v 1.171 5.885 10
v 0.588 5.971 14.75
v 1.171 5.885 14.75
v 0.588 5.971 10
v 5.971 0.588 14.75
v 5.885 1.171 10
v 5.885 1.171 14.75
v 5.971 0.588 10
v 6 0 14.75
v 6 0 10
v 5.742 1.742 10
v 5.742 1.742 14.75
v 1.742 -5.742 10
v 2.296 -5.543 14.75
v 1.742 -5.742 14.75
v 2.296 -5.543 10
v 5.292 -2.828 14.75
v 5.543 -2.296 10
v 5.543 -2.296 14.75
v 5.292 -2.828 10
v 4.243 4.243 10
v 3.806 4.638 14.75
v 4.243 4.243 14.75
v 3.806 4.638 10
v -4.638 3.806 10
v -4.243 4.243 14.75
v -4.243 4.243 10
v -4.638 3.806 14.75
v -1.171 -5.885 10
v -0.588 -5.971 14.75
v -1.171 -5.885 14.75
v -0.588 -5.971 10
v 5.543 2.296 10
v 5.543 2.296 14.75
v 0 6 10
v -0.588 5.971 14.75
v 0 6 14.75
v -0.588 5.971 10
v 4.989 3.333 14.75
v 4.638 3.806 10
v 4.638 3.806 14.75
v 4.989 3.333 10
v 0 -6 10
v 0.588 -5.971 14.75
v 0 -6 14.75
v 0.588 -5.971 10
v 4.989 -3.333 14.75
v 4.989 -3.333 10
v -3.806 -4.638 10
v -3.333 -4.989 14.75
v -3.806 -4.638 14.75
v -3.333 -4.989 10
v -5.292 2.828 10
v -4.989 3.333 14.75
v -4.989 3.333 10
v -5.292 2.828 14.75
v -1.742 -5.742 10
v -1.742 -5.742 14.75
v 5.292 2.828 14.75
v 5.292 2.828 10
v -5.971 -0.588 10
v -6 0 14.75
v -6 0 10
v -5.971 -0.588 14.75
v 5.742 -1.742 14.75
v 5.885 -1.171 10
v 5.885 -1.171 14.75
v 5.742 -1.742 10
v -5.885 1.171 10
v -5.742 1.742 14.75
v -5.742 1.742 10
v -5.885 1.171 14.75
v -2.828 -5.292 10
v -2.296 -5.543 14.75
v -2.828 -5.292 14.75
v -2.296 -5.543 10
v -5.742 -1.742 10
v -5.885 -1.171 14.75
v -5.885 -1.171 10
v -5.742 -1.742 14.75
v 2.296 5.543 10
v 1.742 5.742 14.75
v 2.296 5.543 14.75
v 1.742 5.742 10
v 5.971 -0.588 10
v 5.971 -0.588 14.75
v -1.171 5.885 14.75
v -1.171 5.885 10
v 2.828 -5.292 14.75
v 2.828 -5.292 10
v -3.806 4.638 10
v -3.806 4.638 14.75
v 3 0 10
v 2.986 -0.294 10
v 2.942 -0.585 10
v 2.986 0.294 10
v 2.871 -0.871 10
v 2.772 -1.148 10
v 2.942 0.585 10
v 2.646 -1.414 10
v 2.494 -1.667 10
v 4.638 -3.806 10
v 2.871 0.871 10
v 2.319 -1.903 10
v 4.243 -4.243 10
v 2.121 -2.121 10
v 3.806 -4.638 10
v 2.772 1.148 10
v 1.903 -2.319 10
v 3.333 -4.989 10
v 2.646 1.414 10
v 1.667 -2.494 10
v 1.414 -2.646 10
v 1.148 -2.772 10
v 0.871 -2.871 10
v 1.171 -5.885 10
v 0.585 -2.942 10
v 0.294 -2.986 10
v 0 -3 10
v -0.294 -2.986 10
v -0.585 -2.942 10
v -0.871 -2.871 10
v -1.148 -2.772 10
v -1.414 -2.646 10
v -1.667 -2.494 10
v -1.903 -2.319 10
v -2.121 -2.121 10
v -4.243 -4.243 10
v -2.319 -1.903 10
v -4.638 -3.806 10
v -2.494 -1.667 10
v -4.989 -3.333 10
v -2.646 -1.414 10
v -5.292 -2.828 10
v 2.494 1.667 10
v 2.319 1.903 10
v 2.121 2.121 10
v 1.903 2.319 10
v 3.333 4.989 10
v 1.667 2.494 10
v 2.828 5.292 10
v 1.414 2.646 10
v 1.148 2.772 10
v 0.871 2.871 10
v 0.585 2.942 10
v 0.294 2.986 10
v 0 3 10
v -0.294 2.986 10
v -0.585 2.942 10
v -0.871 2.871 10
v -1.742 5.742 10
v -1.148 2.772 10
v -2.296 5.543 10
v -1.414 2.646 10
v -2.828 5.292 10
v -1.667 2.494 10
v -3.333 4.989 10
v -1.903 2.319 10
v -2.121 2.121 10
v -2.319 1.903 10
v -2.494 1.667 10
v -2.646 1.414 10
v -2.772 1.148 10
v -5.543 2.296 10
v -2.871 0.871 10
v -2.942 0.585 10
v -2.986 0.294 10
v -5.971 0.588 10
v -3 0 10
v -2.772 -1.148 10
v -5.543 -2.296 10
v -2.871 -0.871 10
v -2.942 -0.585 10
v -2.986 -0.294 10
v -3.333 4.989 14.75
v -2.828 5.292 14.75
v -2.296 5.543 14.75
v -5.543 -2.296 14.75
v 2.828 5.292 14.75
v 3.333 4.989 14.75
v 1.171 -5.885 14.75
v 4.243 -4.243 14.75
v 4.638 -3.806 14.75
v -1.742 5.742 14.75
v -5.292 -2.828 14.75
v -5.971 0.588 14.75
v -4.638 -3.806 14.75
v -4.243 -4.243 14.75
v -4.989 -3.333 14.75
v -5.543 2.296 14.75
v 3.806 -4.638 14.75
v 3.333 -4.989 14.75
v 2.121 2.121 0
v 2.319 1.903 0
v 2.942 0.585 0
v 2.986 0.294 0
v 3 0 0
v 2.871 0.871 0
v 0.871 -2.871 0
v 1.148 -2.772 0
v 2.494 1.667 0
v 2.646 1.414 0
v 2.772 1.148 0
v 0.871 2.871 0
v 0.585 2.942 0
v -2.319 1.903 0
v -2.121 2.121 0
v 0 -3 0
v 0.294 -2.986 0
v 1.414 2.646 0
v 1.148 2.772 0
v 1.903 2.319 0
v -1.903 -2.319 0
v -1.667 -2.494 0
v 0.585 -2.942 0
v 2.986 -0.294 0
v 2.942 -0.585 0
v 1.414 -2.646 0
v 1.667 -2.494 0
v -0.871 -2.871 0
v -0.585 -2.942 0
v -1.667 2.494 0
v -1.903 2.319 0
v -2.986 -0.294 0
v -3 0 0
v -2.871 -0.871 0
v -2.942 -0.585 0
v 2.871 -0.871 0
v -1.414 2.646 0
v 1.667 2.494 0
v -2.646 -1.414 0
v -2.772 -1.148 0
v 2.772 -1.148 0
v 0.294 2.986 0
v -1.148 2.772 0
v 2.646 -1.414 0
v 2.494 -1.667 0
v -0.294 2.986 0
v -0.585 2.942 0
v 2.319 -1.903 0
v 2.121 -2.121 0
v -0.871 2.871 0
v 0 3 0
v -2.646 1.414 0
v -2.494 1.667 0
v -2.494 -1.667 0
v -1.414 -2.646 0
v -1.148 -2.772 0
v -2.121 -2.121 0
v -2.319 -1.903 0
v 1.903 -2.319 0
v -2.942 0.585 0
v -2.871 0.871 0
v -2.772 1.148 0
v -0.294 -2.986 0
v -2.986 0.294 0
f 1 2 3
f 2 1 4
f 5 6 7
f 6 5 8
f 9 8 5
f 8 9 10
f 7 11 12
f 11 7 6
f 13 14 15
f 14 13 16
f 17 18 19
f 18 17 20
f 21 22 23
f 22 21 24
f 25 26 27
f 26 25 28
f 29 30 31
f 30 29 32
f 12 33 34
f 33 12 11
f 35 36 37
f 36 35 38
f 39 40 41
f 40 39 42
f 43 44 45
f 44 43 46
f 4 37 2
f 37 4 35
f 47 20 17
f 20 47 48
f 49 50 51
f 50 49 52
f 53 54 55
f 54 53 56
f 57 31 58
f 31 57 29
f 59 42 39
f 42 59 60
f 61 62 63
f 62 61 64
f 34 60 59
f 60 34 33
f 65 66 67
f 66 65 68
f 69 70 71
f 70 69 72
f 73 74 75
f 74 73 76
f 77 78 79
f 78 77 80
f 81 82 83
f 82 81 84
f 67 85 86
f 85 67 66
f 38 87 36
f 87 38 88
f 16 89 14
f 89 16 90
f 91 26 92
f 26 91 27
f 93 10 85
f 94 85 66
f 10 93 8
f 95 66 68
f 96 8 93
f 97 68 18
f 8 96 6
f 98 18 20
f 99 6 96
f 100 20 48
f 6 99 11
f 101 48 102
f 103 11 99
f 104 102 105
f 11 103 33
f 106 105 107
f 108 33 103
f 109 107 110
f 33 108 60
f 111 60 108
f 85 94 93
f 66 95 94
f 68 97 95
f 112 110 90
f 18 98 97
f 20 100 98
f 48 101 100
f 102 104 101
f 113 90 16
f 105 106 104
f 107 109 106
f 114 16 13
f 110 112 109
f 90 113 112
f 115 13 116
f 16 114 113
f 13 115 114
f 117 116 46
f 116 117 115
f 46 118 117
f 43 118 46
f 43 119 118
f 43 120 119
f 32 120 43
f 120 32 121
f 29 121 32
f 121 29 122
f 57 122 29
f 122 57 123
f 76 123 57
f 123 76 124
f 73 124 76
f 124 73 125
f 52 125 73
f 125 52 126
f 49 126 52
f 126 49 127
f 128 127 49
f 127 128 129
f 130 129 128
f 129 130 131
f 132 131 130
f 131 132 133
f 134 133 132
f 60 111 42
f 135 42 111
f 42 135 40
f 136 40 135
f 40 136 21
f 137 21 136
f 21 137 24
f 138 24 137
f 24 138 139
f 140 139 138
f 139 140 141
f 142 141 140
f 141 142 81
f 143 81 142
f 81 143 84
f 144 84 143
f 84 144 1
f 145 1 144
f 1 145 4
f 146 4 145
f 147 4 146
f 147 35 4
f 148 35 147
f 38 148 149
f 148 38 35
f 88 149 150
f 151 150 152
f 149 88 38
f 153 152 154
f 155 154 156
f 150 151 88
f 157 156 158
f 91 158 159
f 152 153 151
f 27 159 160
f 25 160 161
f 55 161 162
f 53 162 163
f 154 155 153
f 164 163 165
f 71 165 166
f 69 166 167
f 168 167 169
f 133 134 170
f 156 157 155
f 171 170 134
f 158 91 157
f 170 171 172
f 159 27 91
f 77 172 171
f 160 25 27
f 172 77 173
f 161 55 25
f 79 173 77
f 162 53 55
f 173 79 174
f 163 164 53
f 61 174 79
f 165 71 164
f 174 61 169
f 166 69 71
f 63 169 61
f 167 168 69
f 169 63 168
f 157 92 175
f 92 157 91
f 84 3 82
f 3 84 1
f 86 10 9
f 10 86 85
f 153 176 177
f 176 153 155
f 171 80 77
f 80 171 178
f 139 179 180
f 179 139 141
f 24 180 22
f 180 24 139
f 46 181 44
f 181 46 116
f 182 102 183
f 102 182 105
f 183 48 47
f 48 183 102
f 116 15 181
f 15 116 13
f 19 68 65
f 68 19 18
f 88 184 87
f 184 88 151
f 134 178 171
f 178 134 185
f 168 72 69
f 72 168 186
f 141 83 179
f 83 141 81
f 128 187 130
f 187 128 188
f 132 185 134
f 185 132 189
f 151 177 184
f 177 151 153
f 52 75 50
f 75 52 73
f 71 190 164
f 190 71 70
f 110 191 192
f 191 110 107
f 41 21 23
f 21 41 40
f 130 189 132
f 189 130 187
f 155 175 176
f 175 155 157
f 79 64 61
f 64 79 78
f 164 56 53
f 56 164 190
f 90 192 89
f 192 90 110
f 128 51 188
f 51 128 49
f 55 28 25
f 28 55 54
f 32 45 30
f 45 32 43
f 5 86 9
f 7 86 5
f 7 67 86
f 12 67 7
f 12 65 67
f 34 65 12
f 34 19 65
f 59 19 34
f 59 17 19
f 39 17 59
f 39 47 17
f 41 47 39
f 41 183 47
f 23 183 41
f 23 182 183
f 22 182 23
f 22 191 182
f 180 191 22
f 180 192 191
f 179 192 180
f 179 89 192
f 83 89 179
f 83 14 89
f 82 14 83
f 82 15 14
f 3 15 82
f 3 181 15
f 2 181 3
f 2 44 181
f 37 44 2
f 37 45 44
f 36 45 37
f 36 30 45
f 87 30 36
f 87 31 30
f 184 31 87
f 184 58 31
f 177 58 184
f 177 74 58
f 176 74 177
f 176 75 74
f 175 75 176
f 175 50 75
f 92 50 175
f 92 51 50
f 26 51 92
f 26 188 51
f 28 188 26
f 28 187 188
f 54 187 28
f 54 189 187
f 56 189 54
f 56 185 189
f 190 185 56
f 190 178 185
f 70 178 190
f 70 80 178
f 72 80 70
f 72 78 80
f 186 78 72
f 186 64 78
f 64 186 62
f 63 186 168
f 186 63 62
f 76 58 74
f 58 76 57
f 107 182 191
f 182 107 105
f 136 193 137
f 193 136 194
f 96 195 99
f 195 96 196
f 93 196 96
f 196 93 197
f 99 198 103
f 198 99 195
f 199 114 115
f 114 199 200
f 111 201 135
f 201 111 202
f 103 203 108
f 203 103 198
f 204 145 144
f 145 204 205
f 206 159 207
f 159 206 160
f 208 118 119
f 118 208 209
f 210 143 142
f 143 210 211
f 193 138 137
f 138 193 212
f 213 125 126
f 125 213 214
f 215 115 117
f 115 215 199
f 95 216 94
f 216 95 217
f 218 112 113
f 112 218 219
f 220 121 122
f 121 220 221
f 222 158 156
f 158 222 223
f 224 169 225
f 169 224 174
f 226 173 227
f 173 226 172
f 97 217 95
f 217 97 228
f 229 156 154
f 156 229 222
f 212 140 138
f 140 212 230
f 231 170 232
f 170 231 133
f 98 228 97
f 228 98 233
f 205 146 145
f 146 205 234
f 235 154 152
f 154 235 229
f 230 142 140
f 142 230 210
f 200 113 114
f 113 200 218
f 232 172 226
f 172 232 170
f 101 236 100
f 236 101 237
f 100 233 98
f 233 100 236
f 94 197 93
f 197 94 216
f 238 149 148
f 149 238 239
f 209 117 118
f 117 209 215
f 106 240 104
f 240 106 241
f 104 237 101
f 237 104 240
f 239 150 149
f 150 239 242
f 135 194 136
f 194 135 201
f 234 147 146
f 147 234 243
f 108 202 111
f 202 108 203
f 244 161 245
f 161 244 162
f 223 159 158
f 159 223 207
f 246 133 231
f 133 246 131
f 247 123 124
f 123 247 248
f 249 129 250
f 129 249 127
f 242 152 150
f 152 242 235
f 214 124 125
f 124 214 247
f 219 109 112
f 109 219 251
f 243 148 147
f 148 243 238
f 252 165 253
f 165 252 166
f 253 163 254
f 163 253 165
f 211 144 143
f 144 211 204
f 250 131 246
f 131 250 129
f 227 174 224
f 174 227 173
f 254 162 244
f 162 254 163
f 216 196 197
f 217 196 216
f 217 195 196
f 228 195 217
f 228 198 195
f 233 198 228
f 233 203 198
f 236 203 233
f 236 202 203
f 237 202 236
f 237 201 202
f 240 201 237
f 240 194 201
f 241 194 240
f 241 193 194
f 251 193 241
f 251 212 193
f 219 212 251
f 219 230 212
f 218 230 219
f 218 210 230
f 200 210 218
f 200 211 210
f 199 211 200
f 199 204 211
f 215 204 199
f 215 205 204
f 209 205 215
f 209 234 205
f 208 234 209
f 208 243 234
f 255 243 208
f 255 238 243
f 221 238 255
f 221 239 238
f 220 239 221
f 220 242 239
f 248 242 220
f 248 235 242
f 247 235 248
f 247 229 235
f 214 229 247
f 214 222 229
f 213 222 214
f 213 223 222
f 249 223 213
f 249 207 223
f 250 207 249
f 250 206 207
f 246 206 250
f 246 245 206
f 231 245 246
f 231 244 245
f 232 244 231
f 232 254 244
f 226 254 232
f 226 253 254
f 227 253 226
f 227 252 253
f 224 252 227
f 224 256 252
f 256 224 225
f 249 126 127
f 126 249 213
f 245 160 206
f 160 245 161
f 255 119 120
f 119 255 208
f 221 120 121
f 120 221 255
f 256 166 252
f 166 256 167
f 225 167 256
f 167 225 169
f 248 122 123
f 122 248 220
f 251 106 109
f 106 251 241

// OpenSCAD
module pan_head_screw() {
    union() {
        // Screw head
        translate([0, 0, 10])
            cylinder(h = 4.75, d = 12.0, $fn = 64);
        
        // Screw body
        cylinder(h = 10, d = 6.0, $fn = 64);
    }
}

pan_head_screw();
